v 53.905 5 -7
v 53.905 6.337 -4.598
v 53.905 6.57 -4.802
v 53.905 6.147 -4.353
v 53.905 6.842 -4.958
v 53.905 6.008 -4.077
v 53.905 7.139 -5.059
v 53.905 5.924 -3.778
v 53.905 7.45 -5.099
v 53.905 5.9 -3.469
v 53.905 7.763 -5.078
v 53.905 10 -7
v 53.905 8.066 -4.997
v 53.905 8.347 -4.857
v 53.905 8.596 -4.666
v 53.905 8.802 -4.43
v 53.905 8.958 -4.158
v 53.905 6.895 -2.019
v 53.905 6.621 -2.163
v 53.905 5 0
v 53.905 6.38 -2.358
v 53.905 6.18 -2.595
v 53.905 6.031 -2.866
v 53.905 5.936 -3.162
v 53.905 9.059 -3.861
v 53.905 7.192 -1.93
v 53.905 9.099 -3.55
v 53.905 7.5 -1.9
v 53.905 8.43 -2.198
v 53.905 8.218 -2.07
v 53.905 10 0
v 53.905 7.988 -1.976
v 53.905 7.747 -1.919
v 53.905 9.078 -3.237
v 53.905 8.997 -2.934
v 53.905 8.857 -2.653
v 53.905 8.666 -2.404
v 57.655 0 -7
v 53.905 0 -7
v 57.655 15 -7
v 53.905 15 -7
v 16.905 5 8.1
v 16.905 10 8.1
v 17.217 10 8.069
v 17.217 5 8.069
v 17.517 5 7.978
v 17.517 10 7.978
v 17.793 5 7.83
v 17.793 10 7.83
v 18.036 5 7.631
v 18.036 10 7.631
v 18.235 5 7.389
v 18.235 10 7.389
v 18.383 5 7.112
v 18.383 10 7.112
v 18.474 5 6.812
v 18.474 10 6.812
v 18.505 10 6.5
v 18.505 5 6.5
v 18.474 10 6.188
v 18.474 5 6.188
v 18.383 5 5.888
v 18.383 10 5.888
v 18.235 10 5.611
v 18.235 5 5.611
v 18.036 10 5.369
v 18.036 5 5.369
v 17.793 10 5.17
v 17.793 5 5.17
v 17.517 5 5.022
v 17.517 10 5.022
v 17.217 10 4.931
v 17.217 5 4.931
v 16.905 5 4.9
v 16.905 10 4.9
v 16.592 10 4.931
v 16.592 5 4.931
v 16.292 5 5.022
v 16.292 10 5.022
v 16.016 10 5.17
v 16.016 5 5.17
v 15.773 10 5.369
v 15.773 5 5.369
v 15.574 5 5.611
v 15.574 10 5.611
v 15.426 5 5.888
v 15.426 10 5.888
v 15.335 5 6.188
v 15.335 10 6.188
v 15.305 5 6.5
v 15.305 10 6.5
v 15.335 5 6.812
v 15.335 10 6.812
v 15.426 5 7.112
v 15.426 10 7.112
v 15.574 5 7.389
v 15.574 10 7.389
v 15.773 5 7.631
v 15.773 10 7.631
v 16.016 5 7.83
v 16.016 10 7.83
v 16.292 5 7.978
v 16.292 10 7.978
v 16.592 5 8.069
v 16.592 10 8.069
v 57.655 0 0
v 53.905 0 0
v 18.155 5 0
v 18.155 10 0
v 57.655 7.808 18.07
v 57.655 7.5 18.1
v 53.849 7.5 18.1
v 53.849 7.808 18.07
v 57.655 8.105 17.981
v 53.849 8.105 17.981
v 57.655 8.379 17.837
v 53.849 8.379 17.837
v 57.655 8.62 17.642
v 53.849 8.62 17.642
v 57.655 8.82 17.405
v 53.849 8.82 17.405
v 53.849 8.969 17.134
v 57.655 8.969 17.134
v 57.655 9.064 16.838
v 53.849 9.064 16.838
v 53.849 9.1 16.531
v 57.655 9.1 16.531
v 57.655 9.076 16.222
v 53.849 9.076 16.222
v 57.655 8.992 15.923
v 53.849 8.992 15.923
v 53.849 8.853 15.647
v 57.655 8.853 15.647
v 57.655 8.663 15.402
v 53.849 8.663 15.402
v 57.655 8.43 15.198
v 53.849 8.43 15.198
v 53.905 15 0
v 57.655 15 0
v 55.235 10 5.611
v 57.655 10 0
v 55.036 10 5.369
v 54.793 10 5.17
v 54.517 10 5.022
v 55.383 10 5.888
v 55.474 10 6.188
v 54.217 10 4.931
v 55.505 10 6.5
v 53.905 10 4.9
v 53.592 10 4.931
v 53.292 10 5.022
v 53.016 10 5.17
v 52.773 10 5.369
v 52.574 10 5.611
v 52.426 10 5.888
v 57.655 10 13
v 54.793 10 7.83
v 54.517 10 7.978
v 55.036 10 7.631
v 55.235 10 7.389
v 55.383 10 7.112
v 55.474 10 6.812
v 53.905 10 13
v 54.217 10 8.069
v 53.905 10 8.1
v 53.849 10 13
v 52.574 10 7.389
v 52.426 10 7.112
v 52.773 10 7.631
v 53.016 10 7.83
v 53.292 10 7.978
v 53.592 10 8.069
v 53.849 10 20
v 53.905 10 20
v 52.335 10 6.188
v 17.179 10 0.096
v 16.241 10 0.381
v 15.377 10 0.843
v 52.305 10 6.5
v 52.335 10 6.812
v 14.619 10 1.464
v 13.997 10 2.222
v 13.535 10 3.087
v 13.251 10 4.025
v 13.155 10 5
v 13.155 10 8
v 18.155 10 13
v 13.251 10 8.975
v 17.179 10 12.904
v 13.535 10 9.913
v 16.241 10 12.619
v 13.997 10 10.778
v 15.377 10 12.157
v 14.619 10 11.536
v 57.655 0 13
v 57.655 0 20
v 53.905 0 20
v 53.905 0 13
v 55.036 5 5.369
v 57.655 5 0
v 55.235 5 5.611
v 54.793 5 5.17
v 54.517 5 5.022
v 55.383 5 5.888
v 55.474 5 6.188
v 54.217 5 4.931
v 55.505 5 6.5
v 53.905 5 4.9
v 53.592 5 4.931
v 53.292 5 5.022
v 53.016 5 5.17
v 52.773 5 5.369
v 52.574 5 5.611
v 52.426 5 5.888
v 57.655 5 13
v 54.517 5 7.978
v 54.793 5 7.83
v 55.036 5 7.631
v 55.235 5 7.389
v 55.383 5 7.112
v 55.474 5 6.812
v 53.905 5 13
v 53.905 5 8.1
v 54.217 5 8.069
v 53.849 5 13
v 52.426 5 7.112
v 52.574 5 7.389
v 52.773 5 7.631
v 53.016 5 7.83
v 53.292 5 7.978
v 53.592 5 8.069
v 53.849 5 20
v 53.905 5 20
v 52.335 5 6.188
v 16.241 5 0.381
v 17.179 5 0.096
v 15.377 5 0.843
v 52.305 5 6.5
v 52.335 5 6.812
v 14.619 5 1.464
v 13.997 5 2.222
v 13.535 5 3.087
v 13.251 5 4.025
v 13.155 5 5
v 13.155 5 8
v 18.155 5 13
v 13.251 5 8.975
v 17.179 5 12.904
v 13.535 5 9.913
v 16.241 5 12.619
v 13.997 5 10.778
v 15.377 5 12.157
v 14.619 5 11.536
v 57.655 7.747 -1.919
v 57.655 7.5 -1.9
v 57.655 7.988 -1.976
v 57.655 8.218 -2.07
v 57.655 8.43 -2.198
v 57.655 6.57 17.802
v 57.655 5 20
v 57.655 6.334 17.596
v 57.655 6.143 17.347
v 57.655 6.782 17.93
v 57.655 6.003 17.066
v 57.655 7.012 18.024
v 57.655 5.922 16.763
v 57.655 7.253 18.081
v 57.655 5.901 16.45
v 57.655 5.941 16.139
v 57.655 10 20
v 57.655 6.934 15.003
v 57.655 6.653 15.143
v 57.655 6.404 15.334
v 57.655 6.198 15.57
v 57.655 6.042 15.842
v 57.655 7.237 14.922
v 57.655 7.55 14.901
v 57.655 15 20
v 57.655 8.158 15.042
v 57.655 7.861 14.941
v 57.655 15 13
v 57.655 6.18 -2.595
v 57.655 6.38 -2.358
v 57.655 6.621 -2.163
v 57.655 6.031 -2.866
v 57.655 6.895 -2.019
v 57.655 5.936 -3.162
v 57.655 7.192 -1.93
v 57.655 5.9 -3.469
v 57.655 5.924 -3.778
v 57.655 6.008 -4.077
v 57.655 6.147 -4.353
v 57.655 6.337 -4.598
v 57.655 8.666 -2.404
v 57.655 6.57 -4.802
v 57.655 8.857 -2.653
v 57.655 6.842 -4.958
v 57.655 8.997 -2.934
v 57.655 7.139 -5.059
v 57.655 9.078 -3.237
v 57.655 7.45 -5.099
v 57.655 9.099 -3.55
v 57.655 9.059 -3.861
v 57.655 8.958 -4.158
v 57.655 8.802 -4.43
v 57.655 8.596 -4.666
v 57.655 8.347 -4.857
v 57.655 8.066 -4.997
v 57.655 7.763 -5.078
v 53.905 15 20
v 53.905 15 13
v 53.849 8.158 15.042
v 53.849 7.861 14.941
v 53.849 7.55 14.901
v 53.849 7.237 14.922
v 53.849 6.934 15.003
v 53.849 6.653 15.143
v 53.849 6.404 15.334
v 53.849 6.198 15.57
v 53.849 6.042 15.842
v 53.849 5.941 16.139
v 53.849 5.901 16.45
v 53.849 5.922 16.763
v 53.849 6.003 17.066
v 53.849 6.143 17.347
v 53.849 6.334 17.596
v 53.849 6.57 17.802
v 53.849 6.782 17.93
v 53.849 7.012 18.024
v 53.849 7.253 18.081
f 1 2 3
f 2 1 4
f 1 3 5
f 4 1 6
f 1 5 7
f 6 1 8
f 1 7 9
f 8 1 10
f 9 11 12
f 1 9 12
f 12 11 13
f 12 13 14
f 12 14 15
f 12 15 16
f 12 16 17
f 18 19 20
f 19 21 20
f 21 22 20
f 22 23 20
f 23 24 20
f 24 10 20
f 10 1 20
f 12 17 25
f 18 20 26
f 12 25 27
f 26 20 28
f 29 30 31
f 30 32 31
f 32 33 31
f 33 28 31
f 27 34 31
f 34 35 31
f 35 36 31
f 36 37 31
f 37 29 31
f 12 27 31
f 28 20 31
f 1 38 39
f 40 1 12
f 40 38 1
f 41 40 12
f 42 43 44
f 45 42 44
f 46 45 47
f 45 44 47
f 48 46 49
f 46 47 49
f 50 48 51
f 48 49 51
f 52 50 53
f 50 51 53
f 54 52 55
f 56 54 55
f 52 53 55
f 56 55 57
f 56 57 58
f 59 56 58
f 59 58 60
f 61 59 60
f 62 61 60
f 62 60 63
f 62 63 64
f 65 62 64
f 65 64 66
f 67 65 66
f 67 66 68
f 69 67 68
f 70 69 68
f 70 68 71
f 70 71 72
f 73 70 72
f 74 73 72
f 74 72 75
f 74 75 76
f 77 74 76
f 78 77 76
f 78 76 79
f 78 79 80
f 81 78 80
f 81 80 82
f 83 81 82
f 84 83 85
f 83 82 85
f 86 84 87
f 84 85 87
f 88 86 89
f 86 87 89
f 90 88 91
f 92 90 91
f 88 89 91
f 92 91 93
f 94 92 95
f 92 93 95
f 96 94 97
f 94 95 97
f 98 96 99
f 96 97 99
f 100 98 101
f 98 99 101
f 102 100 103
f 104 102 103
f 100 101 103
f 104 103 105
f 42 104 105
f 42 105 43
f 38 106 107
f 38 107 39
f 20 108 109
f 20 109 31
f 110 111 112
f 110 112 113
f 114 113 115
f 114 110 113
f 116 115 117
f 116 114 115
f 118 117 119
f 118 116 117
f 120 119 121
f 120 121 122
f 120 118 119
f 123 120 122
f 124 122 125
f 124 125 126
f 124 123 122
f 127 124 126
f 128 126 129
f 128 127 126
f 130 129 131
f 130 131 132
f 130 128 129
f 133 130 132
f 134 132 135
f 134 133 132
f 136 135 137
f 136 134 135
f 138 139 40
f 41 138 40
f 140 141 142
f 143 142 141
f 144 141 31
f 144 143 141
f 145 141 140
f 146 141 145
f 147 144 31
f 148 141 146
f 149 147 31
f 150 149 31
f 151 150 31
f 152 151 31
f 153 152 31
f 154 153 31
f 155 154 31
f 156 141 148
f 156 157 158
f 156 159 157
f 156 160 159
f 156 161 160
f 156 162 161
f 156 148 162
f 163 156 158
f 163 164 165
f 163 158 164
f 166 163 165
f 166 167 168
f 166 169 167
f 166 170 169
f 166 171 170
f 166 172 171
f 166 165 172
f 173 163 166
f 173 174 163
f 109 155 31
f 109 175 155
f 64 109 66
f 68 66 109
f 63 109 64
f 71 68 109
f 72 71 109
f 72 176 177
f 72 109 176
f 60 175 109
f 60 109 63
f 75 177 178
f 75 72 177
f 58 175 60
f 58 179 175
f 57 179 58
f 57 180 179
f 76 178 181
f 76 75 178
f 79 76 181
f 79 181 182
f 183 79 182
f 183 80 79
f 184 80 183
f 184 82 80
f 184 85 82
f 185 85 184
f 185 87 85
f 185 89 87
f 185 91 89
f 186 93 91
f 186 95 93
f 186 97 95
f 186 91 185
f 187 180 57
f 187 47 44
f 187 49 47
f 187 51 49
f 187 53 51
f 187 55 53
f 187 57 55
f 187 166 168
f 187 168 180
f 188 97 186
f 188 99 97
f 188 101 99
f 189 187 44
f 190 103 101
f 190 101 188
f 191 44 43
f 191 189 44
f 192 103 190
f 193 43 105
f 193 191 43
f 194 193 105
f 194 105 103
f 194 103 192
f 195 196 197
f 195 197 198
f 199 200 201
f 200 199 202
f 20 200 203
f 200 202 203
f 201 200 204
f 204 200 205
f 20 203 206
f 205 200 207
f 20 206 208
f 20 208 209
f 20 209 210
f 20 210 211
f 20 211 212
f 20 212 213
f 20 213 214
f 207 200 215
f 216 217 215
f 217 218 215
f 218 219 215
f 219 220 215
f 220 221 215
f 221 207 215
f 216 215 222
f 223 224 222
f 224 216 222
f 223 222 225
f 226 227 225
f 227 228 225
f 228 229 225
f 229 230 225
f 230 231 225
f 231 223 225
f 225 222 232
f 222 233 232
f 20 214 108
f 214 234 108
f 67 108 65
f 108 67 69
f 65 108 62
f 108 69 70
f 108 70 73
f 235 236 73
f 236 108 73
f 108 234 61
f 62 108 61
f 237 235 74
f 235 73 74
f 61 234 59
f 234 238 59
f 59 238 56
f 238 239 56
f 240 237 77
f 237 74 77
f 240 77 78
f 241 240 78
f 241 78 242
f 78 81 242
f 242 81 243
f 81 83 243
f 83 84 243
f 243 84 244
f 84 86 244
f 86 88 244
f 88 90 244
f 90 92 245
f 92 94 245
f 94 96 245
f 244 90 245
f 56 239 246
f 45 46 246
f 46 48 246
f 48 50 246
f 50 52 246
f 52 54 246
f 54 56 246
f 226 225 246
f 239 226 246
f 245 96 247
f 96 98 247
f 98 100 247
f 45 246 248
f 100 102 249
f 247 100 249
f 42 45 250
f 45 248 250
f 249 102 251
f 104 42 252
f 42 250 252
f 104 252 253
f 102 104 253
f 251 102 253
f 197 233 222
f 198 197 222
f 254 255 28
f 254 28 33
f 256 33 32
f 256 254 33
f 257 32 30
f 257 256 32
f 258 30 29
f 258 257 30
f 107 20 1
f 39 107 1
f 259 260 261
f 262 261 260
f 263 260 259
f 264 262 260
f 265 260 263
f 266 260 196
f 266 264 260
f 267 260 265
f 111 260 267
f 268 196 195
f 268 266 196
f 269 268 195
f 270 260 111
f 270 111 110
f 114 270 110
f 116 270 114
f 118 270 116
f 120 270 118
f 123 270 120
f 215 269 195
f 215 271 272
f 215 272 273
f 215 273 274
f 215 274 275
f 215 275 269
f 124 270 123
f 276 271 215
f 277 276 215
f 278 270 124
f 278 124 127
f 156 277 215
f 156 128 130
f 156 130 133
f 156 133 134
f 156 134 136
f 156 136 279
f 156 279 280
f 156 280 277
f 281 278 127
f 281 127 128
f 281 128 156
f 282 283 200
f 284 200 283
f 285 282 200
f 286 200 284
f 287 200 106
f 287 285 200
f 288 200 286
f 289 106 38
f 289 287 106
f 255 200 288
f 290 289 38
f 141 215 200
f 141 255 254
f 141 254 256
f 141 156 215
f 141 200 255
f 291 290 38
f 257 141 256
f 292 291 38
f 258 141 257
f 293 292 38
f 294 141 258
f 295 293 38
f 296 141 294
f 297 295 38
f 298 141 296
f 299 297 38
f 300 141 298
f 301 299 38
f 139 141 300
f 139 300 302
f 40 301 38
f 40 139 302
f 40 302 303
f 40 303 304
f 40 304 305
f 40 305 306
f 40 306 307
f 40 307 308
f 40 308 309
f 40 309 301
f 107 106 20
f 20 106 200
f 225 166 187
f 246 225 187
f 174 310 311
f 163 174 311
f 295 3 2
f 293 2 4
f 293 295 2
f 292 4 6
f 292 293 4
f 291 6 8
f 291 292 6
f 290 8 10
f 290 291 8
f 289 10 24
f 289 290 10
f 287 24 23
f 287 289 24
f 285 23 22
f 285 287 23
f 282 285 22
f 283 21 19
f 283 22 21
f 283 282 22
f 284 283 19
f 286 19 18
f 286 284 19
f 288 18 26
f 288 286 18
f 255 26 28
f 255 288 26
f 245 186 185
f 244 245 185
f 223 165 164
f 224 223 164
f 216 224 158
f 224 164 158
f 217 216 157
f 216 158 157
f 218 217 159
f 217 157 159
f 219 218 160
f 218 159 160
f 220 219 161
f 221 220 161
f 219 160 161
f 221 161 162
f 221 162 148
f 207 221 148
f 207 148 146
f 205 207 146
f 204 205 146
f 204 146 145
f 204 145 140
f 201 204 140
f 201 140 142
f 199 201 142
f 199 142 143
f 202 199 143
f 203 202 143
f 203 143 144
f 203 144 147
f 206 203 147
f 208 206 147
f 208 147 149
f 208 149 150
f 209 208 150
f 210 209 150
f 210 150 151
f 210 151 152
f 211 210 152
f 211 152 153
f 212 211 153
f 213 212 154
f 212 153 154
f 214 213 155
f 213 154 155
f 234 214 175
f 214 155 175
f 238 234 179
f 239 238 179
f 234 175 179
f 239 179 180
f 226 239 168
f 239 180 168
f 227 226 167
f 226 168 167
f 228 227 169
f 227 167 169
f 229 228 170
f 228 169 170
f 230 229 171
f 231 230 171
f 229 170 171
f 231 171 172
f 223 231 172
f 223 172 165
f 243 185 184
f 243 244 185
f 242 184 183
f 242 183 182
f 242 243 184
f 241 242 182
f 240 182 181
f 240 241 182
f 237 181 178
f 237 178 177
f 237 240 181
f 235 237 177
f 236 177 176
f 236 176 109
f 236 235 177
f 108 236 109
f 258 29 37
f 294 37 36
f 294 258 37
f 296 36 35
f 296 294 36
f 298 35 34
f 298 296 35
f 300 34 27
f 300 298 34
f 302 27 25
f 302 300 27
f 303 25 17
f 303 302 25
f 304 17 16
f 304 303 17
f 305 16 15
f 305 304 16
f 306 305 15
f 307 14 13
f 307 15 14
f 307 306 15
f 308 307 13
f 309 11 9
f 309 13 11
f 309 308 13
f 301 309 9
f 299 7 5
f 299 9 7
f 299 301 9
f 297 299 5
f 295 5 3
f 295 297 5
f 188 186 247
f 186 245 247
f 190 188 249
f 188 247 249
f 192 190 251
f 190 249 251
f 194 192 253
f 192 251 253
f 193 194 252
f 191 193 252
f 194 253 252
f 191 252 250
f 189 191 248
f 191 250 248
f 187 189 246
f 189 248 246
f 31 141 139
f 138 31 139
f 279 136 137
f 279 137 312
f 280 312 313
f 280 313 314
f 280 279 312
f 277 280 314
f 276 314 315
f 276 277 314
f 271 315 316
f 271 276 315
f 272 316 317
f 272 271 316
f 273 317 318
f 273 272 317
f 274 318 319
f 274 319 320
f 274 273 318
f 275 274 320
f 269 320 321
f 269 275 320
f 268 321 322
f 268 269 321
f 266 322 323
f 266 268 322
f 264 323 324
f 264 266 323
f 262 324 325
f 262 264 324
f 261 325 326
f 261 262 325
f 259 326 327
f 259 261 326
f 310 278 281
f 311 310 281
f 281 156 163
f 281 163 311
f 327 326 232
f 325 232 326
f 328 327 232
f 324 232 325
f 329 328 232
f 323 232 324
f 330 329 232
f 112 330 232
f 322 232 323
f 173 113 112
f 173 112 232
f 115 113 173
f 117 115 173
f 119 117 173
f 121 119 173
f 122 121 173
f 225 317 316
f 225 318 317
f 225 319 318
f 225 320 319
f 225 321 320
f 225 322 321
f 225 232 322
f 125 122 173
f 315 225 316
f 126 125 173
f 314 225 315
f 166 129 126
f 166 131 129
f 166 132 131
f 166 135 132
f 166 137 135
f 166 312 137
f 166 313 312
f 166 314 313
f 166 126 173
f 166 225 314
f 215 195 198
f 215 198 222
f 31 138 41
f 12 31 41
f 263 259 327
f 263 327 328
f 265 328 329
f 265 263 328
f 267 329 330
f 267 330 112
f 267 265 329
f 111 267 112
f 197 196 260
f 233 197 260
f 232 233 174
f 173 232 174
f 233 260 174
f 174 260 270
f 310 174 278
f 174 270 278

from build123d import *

# Parameters (mm, degrees)
SKETCH_1_W          = 100
SKETCH_1_H          = 100
EXTRUDE_1_DEPTH     = 10
CUT_EXTRUDE_3_DEPTH = 27
CUT_EXTRUDE_4_DEPTH = 27
SKETCH_5_R          = 1.6
CUT_EXTRUDE_5_DEPTH = 27
SKETCH_6_W          = 37
SKETCH_6_H          = 5
SKETCH_6_W_2        = 7.5
CUT_EXTRUDE_6_DEPTH = 27
SKETCH_8_W          = 3.805881933
SKETCH_8_H          = 5
EXTRUDE_2_DEPTH     = 7
SKETCH_10_W         = 3.75
SKETCH_10_H         = 5
EXTRUDE_3_DEPTH     = 7
FILLET_1_R          = 5
FILLET_2_R          = 5
SKETCH_14_W         = 7
SKETCH_14_H         = 5
EXTRUDE_6_DEPTH     = 3.750003
CUT_EXTRUDE_START   = -3.805882
CUT_EXTRUDE_8_DEPTH = 3.805882


with BuildPart() as part:
    # 草图1 → 凸台-拉伸1 (new body)
    with BuildSketch(Plane(origin=(0, 0, 0), x_dir=(1, 0, 0), z_dir=(0, 1, 0))):
        with Locations((50, -50)):
            Rectangle(SKETCH_1_W, SKETCH_1_H)
    extrude(amount=EXTRUDE_1_DEPTH)

    # 草图2 → 切除-拉伸3 (cut)
    with BuildSketch(Plane(origin=(0, 10, 0), x_dir=(1, 0, 0), z_dir=(0, 1, 0))):
        Polygon((50.15455276, -13), (20.65455276, -13), (0, -13), (0, -100), (100, -100), (100, -13), align=None)
    extrude(amount=-CUT_EXTRUDE_3_DEPTH, mode=Mode.SUBTRACT)

    # 草图4 → 切除-拉伸4 (cut)
    with BuildSketch(Plane(origin=(0, 10, 0), x_dir=(1, 0, 0), z_dir=(0, 1, 0))):
        Polygon((13.15455276, -13), (13.15455276, -6.5), (13.15455276, 0), (0, 0), (0, -13), align=None)
        Polygon((100, 0), (57.65455276, 0), (57.65455276, -6.5), (57.65455276, -13), (100, -13), align=None)
    extrude(amount=-CUT_EXTRUDE_4_DEPTH, mode=Mode.SUBTRACT)

    # 草图5 → 切除-拉伸5 (cut)
    with BuildSketch(Plane(origin=(0, 10, 0), x_dir=(1, 0, 0), z_dir=(0, 1, 0))):
        with Locations(Location((16.90455276, -6.5, 0), (0, 0, 270))):
            Circle(SKETCH_5_R)
        with Locations(Location((53.90455276, -6.5, 0), (0, 0, 270))):
            Circle(SKETCH_5_R)
    extrude(amount=-CUT_EXTRUDE_5_DEPTH, mode=Mode.SUBTRACT)

    # 草图6 → 切除-拉伸6 (cut)
    with BuildSketch(Plane.XY.offset(13)):
        with Locations((31.65455276, 2.5)):
            Rectangle(SKETCH_6_W, SKETCH_6_H)
        with Locations((53.90455276, 2.5)):
            Rectangle(SKETCH_6_W_2, SKETCH_6_H)
    extrude(amount=-CUT_EXTRUDE_6_DEPTH, mode=Mode.SUBTRACT)

    # 草图8 → 凸台-拉伸2 (add)
    with BuildSketch(Plane.XY.offset(13)):
        with Locations((55.751611794, 7.5)):
            Rectangle(SKETCH_8_W, SKETCH_8_H)
    extrude(amount=EXTRUDE_2_DEPTH)

    # 草图10 → 凸台-拉伸3 (add)
    with BuildSketch(Plane(origin=(0, 0, 0), x_dir=(-1, 0, 0), z_dir=(0, 0, -1))):
        with Locations((-55.77955276, 7.5)):
            Rectangle(SKETCH_10_W, SKETCH_10_H)
    extrude(amount=EXTRUDE_3_DEPTH)

    # 圆角1
    fillet_1_edges = [part.edges().sort_by_distance(p)[0] for p in [
        (13.15455276, 7.5, 0),
    ]]
    fillet(fillet_1_edges, radius=FILLET_1_R)

    # 圆角2
    fillet_2_edges = [part.edges().sort_by_distance(p)[0] for p in [
        (13.15455276, 7.5, 13),
    ]]
    fillet(fillet_2_edges, radius=FILLET_2_R)

    # 草图14 → 凸台-拉伸6 (add)
    with BuildSketch(Plane(origin=(57.65455276, 0, 0), x_dir=(0, 0, -1), z_dir=(1, 0, 0))):
        with Locations((-16.5, 12.5)):
            Rectangle(SKETCH_14_W, SKETCH_14_H)
        with Locations((-16.5, 2.5)):
            Rectangle(SKETCH_14_W, SKETCH_14_H)
        with Locations((3.5, 12.5)):
            Rectangle(SKETCH_14_W, SKETCH_14_H)
        with Locations((3.5, 2.5)):
            Rectangle(SKETCH_14_W, SKETCH_14_H)
    extrude(amount=-EXTRUDE_6_DEPTH)

    # 草图15 → 切除-拉伸8 (cut)
    with BuildSketch(Plane.ZY.offset(-53.848670827).offset(CUT_EXTRUDE_START)):
        with BuildLine():
            ThreePointArc((-1.9, 7.5), (-1.976327186, 7.98828389), (-2.198026446, 8.42998111))
            Line((-2.198026446, 8.42998111), (-4.801973554, 6.57001889))
            ThreePointArc((-4.801973554, 6.57001889), (-3.01171611, 5.976327186), (-1.9, 7.5))
        make_face()
        with BuildLine():
            Line((-4.801973554, 6.57001889), (-2.198026446, 8.42998111))
            ThreePointArc((-2.198026446, 8.42998111), (-4.42998111, 8.801973554), (-4.801973554, 6.57001889))
        make_face()
        with BuildLine():
            ThreePointArc((18.1, 7.5), (16.98828389, 9.023672814), (15.198026446, 8.42998111))
            Line((15.198026446, 8.42998111), (17.801973554, 6.57001889))
            ThreePointArc((17.801973554, 6.57001889), (18.023672814, 7.01171611), (18.1, 7.5))
        make_face()
        with BuildLine():
            Line((17.801973554, 6.57001889), (15.198026446, 8.42998111))
            ThreePointArc((15.198026446, 8.42998111), (15.57001889, 6.198026446), (17.801973554, 6.57001889))
        make_face()
    extrude(amount=CUT_EXTRUDE_8_DEPTH, mode=Mode.SUBTRACT)


solid = part.part
